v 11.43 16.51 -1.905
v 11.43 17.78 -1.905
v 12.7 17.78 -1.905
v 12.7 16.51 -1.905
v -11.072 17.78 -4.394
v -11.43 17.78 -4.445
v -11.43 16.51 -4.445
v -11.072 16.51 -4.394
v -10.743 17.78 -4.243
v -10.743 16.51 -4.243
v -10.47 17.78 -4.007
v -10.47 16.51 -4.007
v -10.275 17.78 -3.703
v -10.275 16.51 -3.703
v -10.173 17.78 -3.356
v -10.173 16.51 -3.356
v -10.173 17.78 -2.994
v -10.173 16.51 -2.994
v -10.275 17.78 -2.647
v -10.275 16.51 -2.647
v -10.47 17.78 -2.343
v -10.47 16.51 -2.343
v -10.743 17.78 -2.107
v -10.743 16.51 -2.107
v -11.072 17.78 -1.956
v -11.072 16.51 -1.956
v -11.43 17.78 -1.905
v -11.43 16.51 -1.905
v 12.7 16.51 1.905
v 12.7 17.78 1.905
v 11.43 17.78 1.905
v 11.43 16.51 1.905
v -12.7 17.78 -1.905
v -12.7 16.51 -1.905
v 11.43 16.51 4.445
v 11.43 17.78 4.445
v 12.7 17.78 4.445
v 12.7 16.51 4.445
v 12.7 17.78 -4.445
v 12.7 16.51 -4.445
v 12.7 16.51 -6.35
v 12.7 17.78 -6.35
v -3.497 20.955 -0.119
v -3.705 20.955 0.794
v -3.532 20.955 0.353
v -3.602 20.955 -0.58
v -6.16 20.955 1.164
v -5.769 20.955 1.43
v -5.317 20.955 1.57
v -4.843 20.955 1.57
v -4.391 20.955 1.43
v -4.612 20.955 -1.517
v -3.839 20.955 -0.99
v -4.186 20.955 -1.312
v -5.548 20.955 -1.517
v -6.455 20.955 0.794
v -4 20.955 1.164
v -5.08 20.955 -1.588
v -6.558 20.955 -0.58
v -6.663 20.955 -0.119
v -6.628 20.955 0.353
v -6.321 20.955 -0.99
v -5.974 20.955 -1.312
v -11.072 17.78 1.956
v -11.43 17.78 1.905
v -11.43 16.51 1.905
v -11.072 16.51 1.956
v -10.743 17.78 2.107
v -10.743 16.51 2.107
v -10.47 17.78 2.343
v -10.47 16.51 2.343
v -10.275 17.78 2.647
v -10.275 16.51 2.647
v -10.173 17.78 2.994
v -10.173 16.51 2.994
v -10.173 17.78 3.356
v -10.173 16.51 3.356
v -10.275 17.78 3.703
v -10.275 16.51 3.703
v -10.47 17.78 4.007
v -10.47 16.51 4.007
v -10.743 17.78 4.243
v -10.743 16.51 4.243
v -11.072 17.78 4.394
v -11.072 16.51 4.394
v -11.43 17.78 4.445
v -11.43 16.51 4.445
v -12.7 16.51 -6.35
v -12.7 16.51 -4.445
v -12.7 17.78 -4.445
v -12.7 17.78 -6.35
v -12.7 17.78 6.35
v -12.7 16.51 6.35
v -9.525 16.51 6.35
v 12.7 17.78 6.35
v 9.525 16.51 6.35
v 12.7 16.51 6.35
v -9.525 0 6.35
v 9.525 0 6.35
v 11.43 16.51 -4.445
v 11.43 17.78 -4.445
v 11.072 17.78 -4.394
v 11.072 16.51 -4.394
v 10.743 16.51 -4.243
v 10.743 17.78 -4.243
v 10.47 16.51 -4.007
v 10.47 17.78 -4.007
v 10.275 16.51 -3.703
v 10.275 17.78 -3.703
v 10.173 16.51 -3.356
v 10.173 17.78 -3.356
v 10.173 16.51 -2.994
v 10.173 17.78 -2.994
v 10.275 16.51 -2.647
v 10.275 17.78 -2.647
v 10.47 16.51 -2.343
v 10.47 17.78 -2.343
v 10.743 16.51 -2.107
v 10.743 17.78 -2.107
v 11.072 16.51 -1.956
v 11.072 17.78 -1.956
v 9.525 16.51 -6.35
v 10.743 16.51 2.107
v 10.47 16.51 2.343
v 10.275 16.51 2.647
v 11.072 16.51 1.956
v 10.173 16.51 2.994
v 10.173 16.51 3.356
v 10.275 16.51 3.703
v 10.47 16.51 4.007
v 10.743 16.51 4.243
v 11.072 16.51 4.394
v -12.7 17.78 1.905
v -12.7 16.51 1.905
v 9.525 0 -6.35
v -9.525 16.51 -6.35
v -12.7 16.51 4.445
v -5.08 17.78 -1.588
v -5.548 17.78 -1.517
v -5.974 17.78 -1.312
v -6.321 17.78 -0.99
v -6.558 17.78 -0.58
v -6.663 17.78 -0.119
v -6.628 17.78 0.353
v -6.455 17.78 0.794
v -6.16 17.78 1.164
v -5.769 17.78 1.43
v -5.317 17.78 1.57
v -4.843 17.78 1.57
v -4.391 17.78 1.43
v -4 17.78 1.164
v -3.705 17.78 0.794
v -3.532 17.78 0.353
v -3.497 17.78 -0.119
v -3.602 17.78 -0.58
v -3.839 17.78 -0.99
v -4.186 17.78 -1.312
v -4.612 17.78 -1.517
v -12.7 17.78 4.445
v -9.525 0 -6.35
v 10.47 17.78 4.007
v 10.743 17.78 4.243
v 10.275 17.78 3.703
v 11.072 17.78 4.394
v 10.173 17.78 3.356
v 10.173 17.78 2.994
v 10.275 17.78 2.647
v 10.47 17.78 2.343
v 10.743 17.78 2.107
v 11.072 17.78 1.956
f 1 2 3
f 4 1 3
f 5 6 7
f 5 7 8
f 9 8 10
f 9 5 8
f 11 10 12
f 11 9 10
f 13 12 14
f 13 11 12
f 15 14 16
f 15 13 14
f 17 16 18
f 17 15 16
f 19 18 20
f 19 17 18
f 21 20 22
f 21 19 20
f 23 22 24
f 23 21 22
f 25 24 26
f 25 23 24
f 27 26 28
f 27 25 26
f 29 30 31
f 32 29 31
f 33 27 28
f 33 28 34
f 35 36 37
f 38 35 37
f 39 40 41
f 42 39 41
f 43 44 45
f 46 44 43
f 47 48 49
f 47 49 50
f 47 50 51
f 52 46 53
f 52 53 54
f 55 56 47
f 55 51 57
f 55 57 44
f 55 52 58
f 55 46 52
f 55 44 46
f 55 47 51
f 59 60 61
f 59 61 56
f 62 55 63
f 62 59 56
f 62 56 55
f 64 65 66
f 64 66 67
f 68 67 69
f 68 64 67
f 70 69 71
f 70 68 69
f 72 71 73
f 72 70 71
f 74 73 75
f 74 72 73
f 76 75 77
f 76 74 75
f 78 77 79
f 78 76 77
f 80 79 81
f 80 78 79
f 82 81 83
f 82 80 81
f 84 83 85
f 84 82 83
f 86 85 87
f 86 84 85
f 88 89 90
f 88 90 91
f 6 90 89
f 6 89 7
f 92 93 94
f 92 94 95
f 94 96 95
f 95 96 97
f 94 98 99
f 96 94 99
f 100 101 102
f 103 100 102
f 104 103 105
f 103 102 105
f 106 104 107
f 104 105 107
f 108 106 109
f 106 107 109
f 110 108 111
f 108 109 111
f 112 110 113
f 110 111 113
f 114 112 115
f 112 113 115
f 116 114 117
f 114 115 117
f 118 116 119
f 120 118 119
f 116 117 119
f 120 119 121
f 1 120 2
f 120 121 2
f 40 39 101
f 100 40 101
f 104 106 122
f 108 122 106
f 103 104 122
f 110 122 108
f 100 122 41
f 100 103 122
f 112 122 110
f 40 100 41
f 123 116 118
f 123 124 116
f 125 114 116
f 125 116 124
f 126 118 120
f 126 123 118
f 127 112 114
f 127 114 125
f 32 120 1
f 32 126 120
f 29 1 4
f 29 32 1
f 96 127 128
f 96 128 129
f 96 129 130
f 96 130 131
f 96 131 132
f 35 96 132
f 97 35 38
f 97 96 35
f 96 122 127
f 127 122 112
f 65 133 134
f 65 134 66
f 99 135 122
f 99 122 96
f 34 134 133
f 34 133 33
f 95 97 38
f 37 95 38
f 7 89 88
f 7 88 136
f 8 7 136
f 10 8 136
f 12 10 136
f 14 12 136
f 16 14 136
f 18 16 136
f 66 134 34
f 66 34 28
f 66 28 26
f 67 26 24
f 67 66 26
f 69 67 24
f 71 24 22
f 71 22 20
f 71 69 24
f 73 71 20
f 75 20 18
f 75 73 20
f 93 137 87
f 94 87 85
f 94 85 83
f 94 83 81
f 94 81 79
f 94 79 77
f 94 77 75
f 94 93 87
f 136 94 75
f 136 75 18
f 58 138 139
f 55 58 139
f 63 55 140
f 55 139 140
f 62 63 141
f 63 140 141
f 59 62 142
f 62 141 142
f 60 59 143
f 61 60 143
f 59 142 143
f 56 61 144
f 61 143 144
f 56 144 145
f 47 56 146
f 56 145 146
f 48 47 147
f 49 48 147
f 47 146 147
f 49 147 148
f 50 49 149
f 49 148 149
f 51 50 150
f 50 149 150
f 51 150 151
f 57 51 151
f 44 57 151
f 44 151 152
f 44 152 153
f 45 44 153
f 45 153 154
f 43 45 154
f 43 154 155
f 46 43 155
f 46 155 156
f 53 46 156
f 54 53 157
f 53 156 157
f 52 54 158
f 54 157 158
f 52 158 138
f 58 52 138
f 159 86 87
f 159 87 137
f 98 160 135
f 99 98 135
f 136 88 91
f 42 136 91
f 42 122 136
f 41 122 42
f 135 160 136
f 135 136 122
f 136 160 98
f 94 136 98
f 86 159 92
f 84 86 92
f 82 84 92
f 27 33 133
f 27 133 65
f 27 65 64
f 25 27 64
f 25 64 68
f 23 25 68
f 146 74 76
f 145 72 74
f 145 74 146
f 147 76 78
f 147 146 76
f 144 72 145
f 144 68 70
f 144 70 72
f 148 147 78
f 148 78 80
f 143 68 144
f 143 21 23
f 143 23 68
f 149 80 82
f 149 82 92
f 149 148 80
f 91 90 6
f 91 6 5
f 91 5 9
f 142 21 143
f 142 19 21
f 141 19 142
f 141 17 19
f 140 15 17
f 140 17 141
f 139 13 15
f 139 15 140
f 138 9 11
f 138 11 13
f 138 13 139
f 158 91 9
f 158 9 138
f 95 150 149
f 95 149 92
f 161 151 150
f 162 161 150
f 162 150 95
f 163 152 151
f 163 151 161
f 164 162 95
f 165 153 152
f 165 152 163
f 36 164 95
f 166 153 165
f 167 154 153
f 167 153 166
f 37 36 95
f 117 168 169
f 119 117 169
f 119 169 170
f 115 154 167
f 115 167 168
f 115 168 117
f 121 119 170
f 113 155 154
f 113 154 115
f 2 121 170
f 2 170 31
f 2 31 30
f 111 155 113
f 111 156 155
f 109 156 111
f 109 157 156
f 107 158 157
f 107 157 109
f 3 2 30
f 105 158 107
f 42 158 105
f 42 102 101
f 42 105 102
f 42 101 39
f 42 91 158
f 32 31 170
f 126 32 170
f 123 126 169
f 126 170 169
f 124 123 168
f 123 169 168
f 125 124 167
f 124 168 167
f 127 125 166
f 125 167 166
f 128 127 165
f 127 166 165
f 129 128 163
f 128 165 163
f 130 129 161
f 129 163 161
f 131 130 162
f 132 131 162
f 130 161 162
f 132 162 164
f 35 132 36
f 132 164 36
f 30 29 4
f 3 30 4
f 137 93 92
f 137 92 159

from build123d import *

# Parameters (mm, degrees)
SKETCH1_W           = 25.4
SKETCH1_H           = 12.7
BOSS_EXTRUDE1_DEPTH = 17.78
SKETCH2_W           = 3.175
SKETCH2_H           = 12.7
CUT_EXTRUDE1_DEPTH  = 16.51
SKETCH3_R           = 1.5875
BOSS_EXTRUDE2_DEPTH = 3.175
CUT_EXTRUDE2_DEPTH  = 23.753920541


with BuildPart() as part:
    # Sketch1 → Boss-Extrude1 (new body)
    with BuildSketch(Plane(origin=(0, 0, 0), x_dir=(1, 0, 0), z_dir=(0, 1, 0))):
        Rectangle(SKETCH1_W, SKETCH1_H)
    extrude(amount=BOSS_EXTRUDE1_DEPTH)

    # Sketch2 → Cut-Extrude1 (cut)
    with BuildSketch(Plane.XZ):
        with Locations((-11.1125, 0)):
            Rectangle(SKETCH2_W, SKETCH2_H)
        with Locations((11.1125, 0)):
            Rectangle(SKETCH2_W, SKETCH2_H)
    extrude(amount=-CUT_EXTRUDE1_DEPTH, mode=Mode.SUBTRACT)

    # Sketch3 → Boss-Extrude2 (add)
    with BuildSketch(Plane(origin=(0, 17.78, 0), x_dir=(1, 0, 0), z_dir=(0, 1, 0))):
        with Locations(Location((-5.08, 0, 0), (0, 0, 90))):
            Circle(SKETCH3_R)
    extrude(amount=BOSS_EXTRUDE2_DEPTH)

    # Sketch4 → Cut-Extrude2 (cut, through all)
    with BuildSketch(Plane(origin=(0, 17.78, 0), x_dir=(1, 0, 0), z_dir=(0, 1, 0))):
        with BuildLine():
            Line((-11.43, -4.445), (-12.7, -4.445))
            Line((-12.7, -4.445), (-12.7, -1.905))
            Line((-12.7, -1.905), (-11.43, -1.905))
            ThreePointArc((-11.43, -1.905), (-10.16, -3.175), (-11.43, -4.445))
        make_face()
        with BuildLine():
            Line((-11.43, 1.905), (-12.7, 1.905))
            Line((-12.7, 1.905), (-12.7, 4.445))
            Line((-12.7, 4.445), (-11.43, 4.445))
            ThreePointArc((-11.43, 4.445), (-10.16, 3.175), (-11.43, 1.905))
        make_face()
        with BuildLine():
            Line((12.7, 4.445), (11.43, 4.445))
            ThreePointArc((11.43, 4.445), (10.16, 3.175), (11.43, 1.905))
            Line((11.43, 1.905), (12.7, 1.905))
            Line((12.7, 1.905), (12.7, 4.445))
        make_face()
        with BuildLine():
            Line((12.7, -1.905), (11.43, -1.905))
            ThreePointArc((11.43, -1.905), (10.16, -3.175), (11.43, -4.445))
            Line((11.43, -4.445), (12.7, -4.445))
            Line((12.7, -4.445), (12.7, -1.905))
        make_face()
    extrude(amount=-CUT_EXTRUDE2_DEPTH, mode=Mode.SUBTRACT)


solid = part.part
